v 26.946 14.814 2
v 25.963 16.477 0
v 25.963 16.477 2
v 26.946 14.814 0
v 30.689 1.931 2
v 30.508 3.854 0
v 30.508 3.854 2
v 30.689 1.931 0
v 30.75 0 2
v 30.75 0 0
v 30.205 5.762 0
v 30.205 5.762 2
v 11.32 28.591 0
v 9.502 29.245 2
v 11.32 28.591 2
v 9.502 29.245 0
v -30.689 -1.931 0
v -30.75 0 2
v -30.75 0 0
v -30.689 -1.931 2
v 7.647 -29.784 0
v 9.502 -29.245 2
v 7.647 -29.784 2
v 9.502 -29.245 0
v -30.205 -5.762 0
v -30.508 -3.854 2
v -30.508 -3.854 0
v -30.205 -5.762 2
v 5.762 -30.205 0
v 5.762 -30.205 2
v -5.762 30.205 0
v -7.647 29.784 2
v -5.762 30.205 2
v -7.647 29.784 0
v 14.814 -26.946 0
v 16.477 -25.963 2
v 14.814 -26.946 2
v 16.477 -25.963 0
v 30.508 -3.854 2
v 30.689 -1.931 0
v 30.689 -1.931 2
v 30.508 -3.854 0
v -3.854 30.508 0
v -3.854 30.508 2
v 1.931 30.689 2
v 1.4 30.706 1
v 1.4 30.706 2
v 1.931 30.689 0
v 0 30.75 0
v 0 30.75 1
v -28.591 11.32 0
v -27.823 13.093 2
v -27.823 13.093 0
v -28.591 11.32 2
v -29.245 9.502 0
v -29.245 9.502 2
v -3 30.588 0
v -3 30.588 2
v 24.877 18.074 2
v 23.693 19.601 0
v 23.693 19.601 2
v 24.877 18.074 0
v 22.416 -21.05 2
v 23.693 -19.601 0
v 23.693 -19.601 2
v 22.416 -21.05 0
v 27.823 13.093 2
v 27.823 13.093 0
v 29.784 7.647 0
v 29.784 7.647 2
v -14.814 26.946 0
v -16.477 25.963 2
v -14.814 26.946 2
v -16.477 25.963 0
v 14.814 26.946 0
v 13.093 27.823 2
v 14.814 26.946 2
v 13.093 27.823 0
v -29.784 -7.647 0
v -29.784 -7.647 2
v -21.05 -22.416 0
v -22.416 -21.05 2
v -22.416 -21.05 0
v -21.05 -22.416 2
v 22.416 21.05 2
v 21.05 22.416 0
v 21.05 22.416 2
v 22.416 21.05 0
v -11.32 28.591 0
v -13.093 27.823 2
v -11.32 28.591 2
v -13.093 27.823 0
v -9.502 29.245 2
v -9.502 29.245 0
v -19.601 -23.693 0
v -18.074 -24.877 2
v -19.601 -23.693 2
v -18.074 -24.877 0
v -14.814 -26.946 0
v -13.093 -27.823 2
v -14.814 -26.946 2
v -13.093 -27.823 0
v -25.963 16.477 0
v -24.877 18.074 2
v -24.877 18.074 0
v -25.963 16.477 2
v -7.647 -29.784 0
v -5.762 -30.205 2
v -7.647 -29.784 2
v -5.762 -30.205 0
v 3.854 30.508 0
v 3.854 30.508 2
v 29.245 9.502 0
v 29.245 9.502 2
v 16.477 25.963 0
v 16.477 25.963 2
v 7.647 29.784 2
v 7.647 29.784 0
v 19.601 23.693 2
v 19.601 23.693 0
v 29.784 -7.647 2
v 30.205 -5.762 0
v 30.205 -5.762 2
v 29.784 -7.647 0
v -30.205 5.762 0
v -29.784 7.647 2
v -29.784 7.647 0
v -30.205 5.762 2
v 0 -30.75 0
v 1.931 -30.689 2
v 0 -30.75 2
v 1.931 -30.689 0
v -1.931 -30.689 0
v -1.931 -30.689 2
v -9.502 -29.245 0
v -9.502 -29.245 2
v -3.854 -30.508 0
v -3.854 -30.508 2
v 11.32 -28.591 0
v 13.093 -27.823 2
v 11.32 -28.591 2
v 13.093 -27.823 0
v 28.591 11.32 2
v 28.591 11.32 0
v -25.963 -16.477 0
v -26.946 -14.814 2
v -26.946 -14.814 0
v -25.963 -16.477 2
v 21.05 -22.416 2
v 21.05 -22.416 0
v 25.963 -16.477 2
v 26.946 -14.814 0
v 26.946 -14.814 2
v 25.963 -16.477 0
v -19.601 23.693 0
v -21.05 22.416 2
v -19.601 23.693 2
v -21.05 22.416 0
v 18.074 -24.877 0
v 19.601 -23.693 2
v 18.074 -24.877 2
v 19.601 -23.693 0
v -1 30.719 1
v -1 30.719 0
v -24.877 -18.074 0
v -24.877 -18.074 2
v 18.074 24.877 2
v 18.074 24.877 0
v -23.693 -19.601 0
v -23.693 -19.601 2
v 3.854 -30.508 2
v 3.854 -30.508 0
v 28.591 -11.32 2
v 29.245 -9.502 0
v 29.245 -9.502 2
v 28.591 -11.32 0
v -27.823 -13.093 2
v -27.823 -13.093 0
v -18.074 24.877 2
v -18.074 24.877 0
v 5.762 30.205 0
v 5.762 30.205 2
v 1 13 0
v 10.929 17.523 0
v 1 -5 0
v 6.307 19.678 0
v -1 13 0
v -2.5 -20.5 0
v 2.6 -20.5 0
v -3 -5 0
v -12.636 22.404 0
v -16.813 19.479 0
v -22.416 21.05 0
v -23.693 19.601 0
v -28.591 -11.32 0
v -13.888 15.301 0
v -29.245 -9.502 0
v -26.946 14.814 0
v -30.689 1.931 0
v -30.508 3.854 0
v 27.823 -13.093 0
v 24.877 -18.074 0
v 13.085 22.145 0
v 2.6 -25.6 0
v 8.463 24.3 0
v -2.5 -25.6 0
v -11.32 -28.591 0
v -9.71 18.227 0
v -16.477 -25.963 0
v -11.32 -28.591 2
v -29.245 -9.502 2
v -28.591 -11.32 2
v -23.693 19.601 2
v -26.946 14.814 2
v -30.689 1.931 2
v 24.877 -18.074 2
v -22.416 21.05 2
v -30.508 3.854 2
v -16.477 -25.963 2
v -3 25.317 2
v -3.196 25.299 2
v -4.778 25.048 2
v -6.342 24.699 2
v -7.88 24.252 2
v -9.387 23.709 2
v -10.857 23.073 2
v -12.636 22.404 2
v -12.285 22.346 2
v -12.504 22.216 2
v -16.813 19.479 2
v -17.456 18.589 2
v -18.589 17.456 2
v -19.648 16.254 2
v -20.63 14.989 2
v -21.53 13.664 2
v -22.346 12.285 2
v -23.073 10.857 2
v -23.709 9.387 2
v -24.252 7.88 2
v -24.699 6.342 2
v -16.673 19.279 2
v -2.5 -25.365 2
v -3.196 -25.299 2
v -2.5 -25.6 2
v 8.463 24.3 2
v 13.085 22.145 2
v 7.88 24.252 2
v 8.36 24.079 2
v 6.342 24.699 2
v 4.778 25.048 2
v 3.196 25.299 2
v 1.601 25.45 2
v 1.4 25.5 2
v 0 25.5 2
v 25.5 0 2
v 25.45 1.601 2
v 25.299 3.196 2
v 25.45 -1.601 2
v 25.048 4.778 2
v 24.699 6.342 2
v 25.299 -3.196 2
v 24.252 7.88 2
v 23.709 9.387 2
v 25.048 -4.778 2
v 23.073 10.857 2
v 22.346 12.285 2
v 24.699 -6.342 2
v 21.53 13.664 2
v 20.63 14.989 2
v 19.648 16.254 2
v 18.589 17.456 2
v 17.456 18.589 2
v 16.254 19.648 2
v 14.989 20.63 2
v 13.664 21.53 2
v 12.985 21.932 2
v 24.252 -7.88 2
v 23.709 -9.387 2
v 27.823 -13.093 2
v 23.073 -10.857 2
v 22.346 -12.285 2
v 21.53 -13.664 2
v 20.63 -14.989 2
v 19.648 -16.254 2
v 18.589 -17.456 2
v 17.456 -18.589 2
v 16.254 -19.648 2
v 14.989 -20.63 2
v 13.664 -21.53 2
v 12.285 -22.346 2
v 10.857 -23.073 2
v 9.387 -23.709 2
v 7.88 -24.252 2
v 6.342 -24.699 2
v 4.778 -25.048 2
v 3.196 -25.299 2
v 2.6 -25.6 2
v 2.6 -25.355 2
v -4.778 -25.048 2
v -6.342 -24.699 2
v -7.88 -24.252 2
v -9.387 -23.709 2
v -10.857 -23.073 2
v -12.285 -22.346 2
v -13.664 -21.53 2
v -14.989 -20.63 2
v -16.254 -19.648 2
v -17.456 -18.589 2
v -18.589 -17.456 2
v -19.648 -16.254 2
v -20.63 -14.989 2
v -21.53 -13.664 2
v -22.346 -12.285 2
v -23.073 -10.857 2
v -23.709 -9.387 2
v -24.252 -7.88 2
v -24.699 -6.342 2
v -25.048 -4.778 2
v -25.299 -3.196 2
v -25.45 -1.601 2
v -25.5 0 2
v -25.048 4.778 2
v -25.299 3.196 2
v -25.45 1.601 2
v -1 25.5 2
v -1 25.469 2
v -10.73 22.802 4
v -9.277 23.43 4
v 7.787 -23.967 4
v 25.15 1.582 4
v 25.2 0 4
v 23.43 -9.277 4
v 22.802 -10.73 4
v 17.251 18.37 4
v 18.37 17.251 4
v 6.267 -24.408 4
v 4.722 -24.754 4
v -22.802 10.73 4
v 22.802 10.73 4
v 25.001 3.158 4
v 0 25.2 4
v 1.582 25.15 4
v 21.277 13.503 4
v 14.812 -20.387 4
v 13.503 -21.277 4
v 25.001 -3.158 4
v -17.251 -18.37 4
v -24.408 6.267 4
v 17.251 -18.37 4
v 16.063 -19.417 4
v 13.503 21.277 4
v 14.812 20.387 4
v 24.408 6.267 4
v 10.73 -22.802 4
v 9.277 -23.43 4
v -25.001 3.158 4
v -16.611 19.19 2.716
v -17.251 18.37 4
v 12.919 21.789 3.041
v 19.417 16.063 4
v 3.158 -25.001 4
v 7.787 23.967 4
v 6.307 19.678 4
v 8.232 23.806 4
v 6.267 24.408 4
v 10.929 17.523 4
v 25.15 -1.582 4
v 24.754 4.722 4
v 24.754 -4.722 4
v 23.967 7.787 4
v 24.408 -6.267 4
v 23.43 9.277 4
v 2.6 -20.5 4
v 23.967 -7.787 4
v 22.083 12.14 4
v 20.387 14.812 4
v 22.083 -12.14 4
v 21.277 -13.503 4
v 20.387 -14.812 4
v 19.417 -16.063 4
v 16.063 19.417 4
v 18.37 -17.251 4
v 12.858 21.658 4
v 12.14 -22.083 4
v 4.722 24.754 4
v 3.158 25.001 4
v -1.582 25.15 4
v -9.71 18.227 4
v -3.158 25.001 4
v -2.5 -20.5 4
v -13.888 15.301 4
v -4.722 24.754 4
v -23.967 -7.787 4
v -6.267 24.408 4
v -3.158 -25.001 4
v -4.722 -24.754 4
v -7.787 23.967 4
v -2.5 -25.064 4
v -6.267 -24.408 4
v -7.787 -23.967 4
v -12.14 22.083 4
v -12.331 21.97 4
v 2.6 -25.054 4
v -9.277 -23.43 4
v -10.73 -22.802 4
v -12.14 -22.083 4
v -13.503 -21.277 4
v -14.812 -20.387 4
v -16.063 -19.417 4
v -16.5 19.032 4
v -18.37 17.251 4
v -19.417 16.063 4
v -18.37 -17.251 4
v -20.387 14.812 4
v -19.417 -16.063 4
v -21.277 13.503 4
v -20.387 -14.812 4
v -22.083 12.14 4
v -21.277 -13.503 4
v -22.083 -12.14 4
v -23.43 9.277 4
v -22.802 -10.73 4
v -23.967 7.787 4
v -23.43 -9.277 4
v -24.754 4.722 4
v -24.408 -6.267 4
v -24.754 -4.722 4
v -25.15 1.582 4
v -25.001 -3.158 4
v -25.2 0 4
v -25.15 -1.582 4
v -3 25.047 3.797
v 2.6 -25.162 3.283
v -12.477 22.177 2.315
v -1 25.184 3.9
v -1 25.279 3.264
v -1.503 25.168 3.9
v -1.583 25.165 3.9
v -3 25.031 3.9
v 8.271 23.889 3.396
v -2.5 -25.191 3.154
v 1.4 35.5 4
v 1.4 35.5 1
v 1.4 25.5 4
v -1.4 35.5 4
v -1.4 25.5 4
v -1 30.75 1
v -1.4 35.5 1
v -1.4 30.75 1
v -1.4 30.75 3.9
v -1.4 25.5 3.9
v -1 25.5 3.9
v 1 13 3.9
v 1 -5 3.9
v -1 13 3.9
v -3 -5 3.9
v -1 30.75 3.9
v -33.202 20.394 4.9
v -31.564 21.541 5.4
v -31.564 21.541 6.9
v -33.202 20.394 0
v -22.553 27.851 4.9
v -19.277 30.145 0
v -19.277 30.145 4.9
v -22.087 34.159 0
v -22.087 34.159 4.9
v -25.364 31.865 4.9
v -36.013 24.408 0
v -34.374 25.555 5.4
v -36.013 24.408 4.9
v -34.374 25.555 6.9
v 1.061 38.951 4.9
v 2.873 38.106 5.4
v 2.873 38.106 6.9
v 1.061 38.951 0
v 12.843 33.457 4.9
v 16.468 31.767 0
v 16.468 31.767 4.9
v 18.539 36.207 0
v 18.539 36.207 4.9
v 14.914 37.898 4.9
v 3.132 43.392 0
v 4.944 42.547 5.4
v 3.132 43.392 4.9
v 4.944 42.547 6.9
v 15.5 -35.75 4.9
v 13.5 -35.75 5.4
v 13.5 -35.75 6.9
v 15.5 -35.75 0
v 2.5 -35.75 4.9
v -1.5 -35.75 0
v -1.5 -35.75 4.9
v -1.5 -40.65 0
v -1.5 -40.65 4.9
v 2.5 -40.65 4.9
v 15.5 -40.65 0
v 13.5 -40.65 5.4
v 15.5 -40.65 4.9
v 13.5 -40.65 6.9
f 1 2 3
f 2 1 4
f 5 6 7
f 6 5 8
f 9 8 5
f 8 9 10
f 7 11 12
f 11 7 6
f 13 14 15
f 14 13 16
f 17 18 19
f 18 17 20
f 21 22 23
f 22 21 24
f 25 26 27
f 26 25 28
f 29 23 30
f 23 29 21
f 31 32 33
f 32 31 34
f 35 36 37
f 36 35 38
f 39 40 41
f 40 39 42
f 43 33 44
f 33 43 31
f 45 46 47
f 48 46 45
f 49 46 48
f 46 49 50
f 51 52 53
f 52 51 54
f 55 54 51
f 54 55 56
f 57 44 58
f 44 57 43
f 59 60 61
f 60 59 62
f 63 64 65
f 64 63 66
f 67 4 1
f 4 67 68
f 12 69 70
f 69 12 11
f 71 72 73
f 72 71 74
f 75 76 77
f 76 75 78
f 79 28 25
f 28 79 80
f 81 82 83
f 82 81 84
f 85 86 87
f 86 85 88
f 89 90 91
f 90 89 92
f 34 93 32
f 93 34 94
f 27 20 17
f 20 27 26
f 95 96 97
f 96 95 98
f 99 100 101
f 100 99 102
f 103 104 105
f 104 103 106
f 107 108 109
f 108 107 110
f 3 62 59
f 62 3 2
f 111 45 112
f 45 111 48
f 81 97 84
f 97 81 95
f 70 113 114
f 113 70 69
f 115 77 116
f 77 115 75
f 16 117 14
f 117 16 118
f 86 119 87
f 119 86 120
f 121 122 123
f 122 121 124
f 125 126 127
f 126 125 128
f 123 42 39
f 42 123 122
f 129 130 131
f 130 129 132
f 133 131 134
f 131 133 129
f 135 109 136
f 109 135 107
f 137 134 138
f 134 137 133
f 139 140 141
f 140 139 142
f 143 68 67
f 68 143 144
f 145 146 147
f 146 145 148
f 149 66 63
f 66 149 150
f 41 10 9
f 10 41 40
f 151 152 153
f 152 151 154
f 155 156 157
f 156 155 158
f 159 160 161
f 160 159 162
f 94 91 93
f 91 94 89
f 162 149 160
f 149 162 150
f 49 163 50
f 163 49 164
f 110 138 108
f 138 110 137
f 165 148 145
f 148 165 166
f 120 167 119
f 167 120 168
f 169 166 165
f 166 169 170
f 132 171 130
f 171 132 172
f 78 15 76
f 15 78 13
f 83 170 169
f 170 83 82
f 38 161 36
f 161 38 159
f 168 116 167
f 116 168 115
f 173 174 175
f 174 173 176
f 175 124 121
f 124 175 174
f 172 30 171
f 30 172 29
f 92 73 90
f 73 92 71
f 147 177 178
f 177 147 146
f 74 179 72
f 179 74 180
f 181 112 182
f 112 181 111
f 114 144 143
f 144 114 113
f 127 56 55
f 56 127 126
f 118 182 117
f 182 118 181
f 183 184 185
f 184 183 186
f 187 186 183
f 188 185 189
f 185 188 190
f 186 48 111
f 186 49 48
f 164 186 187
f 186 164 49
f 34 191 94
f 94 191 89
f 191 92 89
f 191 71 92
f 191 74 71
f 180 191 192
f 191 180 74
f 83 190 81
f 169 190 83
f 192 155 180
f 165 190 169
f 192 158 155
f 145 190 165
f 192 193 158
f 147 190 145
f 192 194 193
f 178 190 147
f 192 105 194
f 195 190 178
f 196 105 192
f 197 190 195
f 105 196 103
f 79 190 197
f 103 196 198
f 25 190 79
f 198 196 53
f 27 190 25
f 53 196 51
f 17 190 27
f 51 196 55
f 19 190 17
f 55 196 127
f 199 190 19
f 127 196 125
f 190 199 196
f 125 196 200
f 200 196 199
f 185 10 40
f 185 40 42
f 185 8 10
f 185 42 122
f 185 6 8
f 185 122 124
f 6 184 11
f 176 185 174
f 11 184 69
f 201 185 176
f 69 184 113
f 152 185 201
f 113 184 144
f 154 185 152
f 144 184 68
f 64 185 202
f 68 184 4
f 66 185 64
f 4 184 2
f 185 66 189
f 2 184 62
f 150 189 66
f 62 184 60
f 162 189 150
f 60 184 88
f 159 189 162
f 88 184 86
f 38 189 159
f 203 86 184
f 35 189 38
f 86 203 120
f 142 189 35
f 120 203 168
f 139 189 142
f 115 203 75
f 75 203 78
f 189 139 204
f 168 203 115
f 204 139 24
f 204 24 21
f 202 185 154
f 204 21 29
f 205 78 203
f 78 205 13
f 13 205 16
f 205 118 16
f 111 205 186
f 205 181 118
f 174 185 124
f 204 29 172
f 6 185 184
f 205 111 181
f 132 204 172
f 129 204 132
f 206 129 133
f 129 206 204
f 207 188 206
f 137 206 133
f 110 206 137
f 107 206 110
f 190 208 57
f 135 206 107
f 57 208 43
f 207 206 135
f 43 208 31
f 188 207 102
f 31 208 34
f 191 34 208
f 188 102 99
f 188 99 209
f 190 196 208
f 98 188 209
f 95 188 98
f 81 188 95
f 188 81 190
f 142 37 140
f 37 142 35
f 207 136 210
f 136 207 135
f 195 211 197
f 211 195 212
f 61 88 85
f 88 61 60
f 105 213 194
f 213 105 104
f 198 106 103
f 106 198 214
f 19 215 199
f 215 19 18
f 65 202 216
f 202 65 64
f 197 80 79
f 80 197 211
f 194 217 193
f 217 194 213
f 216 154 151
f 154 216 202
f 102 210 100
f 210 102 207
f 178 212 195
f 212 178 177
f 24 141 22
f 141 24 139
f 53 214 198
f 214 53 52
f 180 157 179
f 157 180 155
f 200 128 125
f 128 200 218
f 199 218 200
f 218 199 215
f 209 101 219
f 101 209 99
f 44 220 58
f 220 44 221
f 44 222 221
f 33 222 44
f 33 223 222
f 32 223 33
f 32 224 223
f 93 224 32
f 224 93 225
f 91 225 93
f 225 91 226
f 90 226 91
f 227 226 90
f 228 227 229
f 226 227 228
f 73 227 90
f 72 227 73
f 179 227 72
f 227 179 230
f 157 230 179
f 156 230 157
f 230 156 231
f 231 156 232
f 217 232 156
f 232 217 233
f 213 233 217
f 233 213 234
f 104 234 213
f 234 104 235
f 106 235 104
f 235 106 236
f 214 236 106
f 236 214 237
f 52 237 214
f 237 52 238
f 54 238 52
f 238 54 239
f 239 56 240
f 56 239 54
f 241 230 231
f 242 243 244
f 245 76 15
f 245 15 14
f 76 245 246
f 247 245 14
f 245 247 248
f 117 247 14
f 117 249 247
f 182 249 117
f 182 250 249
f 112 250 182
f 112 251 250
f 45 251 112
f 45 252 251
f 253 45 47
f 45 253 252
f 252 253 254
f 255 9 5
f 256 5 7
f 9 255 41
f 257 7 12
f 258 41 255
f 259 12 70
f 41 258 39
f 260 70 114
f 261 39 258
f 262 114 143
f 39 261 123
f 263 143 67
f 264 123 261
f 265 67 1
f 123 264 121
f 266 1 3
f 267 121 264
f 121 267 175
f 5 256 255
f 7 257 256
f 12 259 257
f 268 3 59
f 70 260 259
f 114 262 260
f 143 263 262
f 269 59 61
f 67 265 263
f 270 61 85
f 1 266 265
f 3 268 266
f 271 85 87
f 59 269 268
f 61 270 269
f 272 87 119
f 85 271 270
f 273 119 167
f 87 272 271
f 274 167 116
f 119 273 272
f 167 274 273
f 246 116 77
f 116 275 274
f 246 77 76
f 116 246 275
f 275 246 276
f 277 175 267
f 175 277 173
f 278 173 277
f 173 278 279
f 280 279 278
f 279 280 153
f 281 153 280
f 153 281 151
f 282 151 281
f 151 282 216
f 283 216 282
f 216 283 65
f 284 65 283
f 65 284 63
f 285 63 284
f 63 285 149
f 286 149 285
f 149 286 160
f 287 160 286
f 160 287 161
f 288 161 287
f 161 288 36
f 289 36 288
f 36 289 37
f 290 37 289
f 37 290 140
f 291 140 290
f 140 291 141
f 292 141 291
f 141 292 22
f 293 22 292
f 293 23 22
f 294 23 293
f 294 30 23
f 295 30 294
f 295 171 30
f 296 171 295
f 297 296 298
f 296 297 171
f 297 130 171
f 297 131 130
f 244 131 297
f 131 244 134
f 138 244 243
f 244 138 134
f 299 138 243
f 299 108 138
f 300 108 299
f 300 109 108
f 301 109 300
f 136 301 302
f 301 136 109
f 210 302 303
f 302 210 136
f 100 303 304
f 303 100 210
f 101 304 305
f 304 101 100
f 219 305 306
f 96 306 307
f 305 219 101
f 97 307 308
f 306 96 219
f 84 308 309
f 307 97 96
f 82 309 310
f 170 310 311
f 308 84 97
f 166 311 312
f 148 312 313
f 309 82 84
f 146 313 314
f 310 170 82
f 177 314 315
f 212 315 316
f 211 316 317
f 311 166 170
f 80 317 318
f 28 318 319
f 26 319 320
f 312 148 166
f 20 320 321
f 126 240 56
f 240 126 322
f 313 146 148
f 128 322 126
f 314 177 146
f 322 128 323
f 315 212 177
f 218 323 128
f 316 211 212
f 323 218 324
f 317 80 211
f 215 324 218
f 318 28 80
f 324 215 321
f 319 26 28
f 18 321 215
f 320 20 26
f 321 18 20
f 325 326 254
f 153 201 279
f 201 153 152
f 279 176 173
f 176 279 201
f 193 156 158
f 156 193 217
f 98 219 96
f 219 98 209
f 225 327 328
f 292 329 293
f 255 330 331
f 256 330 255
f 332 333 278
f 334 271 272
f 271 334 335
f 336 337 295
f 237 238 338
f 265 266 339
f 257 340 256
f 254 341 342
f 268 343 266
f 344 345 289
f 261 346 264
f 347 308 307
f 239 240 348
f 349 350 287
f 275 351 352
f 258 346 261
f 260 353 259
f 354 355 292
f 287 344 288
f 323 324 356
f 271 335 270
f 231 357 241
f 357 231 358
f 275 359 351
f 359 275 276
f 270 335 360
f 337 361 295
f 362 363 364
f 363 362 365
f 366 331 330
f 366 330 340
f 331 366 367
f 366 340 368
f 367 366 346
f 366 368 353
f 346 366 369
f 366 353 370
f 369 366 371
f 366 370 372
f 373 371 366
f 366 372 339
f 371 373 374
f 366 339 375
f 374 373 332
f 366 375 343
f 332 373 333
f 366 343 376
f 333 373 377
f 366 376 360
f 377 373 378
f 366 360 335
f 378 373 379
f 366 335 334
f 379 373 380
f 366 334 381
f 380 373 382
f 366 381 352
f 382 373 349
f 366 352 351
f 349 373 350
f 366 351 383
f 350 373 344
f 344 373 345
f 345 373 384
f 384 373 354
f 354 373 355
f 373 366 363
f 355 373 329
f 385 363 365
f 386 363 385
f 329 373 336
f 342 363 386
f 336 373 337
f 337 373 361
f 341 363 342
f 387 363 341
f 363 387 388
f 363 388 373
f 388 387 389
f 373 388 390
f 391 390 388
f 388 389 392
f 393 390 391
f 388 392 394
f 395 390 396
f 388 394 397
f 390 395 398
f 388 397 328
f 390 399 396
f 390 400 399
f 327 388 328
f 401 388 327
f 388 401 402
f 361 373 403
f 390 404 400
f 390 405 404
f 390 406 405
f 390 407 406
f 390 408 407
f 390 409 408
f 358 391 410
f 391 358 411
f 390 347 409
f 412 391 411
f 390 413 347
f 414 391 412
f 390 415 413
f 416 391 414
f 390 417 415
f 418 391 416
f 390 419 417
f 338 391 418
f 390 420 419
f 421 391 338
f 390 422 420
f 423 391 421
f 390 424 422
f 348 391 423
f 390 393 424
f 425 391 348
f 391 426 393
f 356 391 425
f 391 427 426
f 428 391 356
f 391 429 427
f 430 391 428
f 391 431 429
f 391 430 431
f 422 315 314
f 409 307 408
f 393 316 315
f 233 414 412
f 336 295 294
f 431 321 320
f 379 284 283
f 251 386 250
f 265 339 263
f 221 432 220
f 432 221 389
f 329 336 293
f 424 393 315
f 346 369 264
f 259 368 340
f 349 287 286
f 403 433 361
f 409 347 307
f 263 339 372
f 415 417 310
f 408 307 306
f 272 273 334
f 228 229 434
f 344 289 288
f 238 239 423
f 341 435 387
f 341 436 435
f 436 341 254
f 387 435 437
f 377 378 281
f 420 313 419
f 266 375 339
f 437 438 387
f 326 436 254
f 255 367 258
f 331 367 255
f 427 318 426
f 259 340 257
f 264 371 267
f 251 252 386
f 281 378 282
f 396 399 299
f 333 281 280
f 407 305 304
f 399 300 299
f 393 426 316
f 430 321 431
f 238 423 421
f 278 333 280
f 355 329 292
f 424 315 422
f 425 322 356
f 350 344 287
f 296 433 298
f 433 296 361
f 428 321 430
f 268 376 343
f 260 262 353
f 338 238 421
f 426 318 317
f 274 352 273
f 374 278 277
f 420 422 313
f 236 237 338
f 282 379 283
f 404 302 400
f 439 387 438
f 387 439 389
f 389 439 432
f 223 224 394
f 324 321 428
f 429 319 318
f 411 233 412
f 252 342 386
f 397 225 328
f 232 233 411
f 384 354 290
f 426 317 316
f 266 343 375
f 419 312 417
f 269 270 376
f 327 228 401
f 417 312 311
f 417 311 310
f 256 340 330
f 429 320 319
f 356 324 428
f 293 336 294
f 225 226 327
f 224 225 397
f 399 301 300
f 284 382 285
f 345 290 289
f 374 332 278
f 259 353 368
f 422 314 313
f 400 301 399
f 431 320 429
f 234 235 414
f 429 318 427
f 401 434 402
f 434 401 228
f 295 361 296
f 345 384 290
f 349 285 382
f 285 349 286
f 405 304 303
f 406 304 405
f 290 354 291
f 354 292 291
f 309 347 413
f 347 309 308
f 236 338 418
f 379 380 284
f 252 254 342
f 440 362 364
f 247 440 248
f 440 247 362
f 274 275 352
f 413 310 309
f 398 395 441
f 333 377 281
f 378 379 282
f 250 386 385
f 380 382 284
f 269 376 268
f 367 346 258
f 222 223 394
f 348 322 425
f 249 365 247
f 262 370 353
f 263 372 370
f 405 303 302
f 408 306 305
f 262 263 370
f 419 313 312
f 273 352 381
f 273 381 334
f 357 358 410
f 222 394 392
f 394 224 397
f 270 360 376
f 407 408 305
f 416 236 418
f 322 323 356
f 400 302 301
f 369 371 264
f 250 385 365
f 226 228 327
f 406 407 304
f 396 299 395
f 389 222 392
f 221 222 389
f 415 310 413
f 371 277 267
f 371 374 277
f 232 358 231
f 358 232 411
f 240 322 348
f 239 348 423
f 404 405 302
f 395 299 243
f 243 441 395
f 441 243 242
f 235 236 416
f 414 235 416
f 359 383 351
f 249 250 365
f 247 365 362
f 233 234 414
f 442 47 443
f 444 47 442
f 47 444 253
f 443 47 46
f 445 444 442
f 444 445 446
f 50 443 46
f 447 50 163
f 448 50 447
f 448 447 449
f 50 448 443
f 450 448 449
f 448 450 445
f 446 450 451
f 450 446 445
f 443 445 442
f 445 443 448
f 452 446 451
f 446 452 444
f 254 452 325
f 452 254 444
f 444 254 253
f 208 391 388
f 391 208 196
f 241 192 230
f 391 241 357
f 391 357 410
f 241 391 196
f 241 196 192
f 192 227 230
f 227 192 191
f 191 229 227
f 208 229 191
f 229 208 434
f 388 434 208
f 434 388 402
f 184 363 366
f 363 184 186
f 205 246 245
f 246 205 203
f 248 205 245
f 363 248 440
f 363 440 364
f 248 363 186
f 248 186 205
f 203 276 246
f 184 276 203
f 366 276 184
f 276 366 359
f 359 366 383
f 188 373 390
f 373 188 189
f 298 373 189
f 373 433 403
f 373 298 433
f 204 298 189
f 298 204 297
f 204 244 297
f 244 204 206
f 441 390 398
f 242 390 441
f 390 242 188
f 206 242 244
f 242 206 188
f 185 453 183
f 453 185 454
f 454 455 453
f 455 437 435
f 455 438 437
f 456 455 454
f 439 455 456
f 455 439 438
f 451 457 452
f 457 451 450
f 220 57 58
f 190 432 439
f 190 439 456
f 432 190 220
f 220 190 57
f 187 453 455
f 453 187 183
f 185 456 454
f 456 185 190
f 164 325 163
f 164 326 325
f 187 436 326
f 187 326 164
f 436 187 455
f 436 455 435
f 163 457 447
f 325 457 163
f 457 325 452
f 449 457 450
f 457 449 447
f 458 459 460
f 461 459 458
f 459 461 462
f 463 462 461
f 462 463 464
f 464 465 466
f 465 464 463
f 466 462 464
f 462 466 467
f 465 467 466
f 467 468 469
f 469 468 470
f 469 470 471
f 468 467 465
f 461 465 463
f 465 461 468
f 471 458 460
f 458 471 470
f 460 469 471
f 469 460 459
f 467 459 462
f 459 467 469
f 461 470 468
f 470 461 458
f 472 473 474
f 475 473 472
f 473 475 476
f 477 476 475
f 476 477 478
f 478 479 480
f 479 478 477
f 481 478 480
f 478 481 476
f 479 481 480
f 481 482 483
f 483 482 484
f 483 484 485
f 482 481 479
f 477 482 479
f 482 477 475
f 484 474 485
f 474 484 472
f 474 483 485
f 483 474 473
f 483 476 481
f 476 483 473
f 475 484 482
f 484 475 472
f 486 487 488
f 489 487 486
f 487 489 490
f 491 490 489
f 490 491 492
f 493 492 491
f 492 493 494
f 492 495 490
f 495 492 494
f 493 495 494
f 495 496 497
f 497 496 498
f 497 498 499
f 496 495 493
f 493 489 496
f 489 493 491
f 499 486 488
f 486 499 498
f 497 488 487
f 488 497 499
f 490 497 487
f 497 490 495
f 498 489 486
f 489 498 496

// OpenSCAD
d_full_disc = 61.5;
r_full_disc = d_full_disc/2;
thickness_base = 2;
d_inner_disc = 51;
r_inner_disc = d_inner_disc/2;
thickness_inner = 2;
pegsize = 5;
pegtolerance = .1;
         
function support_angles() = [125,65,270];
function disc_thickness() = thickness_inner + thickness_base;

module support_base(width=4)
{
    depth=disc_thickness();
    linear_extrude(depth,true)
        square(width);
    
}

module support(pegs)
{
    thickness_top = 1.5;
    //extension to back
    thickness_extension = 1.5;
    //protrusion of hook
    hook_protrusion = 2;
    hook_low = thickness_base+13-disc_thickness();
    hook_high = hook_low + 2;
    //height of hook above lowest point
    hook_peak = hook_low+1;
    support_base(pegs);
    rotate([0,90,0])
        linear_extrude(pegs)
            polygon([[0,0],[hook_high,0],[hook_high,pegs],[hook_low,pegs+hook_protrusion],[hook_low,pegs+.5],[0,pegs]]);
}



union(){
    difference(){
        //base circle
        union(){
            cylinder(h = thickness_base, r1 = r_full_disc, r2 = r_full_disc, $fn=100);
            translate([0,0,thickness_base])
                cylinder(h = thickness_inner, r1 = r_inner_disc, r2 = r_inner_disc-.3, $fn=100);
            //'peg', slightly undersized. slit in table is 3mm.
            peg_thickness = 2.8; 
            translate([-peg_thickness/2,r_inner_disc,1])
                cube([peg_thickness,10,3]);
        }
        union()
        {
         for (i=support_angles())
         {
         rotate([0,0,i])
            translate([r_inner_disc-pegsize,-pegsize/2,0])
                support_base(pegsize+pegtolerance);
         }


        //cutout for blade. -.1 in z to get "real" hole and no rendering errors
        translate([-3,0,-.10])
        union(){
            //pocket for sawblade
            translate([-0,-5,0])
                //width of pocket, length of pocket, height (should be > thickness_base + thickness_inner)
                cube([4,18,disc_thickness()]);
            //slit
            cube([2,r_full_disc,disc_thickness()]);

        }
        }

    }
    //supports under different angles
    for (i=support_angles())
     {
     rotate([0,0,i])
        translate([r_full_disc+5,pegsize/2,0])
         rotate([90,0,0])
            support(pegsize-pegtolerance);
     }
}
